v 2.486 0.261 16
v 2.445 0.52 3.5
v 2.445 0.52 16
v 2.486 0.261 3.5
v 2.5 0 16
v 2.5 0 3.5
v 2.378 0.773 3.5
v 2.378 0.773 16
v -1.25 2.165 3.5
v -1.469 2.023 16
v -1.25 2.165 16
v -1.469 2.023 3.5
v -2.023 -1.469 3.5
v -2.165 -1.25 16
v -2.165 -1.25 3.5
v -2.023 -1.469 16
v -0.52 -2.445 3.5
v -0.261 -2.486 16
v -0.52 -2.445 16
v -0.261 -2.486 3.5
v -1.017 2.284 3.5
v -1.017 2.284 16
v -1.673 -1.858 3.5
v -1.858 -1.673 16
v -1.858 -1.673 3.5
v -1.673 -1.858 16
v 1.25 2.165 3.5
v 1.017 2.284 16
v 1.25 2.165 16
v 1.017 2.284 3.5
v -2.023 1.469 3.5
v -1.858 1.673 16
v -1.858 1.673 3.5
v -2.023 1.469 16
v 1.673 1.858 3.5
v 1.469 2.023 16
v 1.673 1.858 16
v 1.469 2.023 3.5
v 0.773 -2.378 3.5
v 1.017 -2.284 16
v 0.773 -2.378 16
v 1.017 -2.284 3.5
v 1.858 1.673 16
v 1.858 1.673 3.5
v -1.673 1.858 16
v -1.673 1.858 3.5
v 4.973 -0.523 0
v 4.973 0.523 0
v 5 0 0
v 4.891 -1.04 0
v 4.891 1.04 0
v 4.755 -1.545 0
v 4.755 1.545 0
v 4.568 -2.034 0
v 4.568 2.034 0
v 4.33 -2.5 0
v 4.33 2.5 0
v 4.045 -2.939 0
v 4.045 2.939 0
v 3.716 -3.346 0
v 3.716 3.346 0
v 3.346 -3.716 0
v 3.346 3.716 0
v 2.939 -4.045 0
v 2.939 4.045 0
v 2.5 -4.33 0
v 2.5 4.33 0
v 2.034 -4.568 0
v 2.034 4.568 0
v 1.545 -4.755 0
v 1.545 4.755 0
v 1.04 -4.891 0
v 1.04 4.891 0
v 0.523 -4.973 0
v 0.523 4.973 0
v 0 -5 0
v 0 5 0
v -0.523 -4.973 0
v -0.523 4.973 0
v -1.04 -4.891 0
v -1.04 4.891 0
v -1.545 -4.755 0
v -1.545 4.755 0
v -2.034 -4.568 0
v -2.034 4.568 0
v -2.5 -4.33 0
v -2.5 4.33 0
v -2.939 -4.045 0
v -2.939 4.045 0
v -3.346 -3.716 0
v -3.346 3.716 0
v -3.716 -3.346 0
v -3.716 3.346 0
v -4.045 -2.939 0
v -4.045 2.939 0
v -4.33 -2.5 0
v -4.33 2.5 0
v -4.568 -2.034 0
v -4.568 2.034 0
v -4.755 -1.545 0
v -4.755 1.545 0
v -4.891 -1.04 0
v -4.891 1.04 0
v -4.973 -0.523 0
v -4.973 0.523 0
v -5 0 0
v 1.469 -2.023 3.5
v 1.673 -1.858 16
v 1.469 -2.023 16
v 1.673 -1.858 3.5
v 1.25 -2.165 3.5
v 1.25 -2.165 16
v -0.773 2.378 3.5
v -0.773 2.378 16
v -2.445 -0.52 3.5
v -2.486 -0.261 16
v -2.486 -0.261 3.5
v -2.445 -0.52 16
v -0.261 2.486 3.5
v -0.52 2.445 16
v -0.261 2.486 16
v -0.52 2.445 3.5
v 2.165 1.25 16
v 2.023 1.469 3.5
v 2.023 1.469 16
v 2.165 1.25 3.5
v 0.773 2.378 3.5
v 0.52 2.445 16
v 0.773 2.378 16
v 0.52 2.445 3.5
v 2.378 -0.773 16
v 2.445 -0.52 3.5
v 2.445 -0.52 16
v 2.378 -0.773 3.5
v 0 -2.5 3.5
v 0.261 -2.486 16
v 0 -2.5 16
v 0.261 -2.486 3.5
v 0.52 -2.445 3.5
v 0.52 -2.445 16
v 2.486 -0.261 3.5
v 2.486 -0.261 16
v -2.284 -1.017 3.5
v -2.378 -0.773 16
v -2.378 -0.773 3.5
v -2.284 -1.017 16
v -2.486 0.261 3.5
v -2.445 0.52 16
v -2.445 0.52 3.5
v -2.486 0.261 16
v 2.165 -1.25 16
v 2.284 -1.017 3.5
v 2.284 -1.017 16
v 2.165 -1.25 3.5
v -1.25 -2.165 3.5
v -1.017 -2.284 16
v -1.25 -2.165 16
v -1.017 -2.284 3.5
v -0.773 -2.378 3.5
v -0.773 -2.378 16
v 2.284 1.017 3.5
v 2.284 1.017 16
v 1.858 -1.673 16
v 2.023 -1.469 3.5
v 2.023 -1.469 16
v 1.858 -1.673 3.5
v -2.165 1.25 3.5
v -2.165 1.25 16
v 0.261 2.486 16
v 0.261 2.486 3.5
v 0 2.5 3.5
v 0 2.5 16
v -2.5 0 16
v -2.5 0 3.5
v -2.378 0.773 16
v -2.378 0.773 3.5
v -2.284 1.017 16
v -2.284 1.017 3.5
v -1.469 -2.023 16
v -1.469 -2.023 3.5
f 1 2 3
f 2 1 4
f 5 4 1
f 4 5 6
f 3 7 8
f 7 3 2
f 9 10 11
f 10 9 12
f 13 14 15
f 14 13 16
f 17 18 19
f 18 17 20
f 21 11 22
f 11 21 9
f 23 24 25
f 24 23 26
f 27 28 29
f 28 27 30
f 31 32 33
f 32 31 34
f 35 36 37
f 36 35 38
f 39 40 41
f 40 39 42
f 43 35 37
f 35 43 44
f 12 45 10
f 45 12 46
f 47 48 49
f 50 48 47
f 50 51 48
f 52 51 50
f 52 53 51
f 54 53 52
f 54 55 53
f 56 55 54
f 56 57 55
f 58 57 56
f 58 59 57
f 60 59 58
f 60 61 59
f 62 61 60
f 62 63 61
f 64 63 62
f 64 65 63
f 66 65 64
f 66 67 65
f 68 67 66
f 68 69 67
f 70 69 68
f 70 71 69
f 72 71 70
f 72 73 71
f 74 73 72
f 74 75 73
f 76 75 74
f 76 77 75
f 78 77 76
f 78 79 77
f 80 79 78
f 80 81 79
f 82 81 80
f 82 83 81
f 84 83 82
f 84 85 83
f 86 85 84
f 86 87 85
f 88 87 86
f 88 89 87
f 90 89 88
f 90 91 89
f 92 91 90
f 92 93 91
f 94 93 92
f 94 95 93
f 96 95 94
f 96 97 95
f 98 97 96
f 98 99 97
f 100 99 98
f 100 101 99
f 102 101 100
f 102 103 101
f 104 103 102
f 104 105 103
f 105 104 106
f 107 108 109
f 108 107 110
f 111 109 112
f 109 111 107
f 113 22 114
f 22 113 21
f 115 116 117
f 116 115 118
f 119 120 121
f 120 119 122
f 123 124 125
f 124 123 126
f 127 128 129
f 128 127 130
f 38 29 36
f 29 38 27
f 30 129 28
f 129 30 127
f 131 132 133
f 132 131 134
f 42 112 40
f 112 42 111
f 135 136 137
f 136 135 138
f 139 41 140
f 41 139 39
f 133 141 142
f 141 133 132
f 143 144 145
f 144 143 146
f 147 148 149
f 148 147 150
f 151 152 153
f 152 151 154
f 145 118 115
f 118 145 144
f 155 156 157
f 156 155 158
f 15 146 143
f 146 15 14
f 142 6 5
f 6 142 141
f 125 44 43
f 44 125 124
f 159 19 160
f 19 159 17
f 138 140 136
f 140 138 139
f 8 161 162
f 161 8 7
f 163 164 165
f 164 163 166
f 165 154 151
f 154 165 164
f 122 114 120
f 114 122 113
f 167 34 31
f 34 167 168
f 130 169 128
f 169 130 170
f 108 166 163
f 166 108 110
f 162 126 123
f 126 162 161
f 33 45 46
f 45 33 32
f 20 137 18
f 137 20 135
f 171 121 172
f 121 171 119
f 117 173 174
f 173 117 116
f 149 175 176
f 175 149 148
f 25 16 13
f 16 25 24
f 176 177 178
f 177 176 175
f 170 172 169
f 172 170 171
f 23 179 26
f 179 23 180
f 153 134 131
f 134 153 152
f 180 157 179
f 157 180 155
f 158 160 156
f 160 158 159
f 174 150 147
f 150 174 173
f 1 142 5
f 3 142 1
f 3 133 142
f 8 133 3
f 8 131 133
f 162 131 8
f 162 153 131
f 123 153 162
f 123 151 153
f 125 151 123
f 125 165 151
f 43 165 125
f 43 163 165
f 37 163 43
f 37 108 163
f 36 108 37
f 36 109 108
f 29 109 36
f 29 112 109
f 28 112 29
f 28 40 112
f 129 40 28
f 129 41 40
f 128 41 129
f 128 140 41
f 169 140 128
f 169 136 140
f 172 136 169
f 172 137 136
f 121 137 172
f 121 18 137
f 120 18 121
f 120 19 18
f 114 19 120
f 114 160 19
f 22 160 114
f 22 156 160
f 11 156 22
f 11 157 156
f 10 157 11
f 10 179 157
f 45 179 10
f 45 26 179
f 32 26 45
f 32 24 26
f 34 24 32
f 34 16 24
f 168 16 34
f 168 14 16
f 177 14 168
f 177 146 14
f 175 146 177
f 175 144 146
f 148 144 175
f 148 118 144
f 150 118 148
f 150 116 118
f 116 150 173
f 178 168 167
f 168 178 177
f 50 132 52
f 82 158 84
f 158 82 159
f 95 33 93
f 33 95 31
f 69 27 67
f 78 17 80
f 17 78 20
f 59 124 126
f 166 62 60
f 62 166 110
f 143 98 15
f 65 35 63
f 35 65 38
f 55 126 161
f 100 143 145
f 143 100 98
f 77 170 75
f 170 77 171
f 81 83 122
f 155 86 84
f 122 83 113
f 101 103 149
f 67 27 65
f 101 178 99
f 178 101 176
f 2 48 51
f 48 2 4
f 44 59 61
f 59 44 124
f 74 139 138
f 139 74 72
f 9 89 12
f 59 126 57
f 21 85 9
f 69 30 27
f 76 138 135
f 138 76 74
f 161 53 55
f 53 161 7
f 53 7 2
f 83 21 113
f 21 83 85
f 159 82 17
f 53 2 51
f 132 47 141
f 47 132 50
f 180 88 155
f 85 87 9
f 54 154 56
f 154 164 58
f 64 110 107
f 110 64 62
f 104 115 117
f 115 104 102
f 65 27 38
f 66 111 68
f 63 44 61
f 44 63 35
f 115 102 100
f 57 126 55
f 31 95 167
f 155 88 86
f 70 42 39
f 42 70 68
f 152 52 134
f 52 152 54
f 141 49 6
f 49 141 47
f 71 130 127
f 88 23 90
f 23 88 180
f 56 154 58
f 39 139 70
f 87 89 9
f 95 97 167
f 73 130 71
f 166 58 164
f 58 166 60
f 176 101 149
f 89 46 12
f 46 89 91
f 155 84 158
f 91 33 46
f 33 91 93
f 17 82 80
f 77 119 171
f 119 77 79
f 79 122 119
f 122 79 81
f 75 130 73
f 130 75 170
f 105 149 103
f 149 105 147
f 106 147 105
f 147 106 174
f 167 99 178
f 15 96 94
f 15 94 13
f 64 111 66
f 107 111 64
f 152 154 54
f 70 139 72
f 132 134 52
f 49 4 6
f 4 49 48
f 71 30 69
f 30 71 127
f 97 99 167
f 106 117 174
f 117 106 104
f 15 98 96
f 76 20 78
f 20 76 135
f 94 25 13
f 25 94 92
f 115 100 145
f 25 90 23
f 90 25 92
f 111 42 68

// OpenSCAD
// Solid rivet.
$fn = 60;
eps = 0.02;
shank_d = 5;
head_d = 10;
length = 16;
union() { cylinder(d=shank_d,h=length); cylinder(d1=head_d,d2=shank_d,h=head_d*0.35); }
